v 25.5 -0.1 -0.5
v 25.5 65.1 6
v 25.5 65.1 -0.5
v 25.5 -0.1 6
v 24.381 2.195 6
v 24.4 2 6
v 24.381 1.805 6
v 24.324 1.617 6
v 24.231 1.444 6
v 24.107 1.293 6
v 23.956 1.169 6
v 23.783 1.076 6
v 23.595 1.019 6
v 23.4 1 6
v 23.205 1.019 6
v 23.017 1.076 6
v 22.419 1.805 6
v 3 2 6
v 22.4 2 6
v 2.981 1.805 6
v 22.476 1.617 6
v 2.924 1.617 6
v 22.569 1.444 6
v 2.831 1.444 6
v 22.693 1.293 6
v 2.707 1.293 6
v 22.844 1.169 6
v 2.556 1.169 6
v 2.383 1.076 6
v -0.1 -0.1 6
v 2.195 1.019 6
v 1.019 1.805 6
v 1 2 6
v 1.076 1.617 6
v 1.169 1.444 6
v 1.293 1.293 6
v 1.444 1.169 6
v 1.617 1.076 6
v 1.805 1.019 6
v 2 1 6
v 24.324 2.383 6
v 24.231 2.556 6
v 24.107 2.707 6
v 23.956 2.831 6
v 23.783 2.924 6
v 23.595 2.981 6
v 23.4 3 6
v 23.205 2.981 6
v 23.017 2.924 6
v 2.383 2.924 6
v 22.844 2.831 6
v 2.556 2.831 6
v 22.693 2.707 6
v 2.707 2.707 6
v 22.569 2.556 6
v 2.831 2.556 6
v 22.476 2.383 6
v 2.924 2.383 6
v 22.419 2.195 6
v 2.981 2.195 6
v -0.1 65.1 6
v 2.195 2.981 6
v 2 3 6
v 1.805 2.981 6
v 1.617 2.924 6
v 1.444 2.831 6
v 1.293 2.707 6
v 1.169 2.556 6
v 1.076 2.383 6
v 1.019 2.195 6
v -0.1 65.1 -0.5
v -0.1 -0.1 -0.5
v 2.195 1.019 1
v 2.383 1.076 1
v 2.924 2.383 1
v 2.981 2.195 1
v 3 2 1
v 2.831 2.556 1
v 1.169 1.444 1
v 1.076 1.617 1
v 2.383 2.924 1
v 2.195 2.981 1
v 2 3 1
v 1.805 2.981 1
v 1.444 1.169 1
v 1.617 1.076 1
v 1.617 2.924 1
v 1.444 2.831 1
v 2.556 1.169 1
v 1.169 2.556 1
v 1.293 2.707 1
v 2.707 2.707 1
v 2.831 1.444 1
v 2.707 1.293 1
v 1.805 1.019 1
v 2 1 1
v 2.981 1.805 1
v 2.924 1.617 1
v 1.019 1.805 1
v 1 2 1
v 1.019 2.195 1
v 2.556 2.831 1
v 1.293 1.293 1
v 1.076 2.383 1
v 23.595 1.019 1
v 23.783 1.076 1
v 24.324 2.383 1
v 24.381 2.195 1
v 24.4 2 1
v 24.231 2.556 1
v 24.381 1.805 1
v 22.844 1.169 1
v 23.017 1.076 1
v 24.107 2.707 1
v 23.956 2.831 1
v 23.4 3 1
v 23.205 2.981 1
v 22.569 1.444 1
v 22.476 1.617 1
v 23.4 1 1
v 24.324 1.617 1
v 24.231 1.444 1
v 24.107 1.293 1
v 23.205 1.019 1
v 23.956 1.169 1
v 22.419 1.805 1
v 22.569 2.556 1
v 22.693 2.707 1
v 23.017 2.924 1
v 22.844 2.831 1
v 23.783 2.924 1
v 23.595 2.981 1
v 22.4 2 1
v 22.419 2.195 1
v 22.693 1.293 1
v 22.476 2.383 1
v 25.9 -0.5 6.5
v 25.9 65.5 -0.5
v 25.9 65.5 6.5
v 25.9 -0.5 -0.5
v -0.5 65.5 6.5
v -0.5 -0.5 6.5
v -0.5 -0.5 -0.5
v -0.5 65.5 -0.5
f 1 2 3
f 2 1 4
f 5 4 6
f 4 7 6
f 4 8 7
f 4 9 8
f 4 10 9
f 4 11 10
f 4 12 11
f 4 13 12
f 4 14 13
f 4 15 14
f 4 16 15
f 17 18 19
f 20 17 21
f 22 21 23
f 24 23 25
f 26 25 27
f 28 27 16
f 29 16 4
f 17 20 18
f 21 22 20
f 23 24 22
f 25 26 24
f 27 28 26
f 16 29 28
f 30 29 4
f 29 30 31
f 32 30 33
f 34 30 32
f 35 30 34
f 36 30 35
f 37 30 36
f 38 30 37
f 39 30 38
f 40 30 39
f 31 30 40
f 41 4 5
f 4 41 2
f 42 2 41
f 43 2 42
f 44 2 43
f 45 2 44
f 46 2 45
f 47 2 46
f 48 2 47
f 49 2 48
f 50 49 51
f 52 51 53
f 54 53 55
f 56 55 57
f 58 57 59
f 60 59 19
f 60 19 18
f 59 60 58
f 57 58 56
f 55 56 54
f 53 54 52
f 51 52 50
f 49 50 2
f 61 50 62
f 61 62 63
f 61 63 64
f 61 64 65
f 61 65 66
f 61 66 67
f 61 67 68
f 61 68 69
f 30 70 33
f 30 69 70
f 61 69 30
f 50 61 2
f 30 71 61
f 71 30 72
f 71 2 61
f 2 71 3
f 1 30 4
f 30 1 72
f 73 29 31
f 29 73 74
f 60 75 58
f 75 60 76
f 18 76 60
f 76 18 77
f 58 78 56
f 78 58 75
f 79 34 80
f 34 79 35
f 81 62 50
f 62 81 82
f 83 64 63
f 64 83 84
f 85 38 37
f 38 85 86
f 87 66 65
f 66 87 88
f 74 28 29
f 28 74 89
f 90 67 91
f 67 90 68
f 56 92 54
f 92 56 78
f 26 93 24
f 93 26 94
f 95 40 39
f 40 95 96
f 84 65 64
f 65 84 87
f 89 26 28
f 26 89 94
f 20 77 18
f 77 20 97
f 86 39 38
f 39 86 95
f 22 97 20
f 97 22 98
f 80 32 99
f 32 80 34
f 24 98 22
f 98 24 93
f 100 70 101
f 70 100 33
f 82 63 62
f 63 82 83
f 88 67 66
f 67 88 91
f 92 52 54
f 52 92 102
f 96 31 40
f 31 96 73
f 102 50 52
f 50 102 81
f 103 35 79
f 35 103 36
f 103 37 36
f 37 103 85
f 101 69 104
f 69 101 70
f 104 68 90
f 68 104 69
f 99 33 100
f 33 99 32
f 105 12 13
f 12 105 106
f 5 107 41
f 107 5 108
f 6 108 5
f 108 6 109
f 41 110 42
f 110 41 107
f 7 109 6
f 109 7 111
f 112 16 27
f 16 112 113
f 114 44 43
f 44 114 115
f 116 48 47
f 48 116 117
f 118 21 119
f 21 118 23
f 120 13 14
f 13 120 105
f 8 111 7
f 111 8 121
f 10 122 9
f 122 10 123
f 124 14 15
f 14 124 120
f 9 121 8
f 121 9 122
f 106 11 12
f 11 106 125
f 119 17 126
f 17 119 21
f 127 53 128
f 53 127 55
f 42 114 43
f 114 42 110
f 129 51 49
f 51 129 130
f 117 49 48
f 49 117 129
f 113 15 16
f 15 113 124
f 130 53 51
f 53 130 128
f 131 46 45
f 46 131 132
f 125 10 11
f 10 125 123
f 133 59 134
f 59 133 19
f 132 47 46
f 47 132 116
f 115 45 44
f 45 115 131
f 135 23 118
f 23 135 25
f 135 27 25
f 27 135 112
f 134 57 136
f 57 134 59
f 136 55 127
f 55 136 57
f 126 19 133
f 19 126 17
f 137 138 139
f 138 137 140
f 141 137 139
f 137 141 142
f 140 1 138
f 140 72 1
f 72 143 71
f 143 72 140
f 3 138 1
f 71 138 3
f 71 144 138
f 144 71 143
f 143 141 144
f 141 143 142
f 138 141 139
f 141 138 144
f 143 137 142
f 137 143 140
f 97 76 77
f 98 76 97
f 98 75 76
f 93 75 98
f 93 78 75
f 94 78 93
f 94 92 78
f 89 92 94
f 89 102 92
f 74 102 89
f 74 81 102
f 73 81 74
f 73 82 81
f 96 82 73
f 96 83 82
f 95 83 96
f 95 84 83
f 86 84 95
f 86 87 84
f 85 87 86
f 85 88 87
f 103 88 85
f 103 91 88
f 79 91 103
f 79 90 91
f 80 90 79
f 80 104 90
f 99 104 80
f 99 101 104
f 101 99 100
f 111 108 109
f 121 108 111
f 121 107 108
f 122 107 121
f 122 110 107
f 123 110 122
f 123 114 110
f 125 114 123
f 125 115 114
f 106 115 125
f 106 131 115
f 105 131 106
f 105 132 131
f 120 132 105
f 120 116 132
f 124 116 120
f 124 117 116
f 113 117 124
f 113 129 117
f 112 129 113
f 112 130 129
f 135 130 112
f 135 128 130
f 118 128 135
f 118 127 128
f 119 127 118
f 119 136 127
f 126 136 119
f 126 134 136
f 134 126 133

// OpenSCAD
// all dimensions in mm
// https://docs.wemos.cc/en/latest/d32/d32_pro.html 

pcb_width = 65;
pcb_height = 25.4;
pcb_depth = 6;

pcb_clearance = 0.2;

// TODO: minkowski edges

module pcb_hole() {
  cylinder(h=8, d=2, center=true, $fn=32);
}

module d32pro_hull_void() { 
  difference() {
    translate([-pcb_clearance/2,-pcb_clearance/2,0]) {
      cube([pcb_height+pcb_clearance,pcb_width+pcb_clearance,pcb_depth]);
      }
          
    translate([2,2,4]) pcb_hole();
    translate([pcb_height-2,2,4]) pcb_hole(); 
  }
}

*d32pro_hull_void();

difference() {
  translate([-0.5,-0.5,-0.5]) cube([26.4,66,7]);
  d32pro_hull_void();
  translate([-pcb_clearance/2,-pcb_clearance/2,-2]) {
    cube([25.4+pcb_clearance,65+pcb_clearance,3]);
  }
}
